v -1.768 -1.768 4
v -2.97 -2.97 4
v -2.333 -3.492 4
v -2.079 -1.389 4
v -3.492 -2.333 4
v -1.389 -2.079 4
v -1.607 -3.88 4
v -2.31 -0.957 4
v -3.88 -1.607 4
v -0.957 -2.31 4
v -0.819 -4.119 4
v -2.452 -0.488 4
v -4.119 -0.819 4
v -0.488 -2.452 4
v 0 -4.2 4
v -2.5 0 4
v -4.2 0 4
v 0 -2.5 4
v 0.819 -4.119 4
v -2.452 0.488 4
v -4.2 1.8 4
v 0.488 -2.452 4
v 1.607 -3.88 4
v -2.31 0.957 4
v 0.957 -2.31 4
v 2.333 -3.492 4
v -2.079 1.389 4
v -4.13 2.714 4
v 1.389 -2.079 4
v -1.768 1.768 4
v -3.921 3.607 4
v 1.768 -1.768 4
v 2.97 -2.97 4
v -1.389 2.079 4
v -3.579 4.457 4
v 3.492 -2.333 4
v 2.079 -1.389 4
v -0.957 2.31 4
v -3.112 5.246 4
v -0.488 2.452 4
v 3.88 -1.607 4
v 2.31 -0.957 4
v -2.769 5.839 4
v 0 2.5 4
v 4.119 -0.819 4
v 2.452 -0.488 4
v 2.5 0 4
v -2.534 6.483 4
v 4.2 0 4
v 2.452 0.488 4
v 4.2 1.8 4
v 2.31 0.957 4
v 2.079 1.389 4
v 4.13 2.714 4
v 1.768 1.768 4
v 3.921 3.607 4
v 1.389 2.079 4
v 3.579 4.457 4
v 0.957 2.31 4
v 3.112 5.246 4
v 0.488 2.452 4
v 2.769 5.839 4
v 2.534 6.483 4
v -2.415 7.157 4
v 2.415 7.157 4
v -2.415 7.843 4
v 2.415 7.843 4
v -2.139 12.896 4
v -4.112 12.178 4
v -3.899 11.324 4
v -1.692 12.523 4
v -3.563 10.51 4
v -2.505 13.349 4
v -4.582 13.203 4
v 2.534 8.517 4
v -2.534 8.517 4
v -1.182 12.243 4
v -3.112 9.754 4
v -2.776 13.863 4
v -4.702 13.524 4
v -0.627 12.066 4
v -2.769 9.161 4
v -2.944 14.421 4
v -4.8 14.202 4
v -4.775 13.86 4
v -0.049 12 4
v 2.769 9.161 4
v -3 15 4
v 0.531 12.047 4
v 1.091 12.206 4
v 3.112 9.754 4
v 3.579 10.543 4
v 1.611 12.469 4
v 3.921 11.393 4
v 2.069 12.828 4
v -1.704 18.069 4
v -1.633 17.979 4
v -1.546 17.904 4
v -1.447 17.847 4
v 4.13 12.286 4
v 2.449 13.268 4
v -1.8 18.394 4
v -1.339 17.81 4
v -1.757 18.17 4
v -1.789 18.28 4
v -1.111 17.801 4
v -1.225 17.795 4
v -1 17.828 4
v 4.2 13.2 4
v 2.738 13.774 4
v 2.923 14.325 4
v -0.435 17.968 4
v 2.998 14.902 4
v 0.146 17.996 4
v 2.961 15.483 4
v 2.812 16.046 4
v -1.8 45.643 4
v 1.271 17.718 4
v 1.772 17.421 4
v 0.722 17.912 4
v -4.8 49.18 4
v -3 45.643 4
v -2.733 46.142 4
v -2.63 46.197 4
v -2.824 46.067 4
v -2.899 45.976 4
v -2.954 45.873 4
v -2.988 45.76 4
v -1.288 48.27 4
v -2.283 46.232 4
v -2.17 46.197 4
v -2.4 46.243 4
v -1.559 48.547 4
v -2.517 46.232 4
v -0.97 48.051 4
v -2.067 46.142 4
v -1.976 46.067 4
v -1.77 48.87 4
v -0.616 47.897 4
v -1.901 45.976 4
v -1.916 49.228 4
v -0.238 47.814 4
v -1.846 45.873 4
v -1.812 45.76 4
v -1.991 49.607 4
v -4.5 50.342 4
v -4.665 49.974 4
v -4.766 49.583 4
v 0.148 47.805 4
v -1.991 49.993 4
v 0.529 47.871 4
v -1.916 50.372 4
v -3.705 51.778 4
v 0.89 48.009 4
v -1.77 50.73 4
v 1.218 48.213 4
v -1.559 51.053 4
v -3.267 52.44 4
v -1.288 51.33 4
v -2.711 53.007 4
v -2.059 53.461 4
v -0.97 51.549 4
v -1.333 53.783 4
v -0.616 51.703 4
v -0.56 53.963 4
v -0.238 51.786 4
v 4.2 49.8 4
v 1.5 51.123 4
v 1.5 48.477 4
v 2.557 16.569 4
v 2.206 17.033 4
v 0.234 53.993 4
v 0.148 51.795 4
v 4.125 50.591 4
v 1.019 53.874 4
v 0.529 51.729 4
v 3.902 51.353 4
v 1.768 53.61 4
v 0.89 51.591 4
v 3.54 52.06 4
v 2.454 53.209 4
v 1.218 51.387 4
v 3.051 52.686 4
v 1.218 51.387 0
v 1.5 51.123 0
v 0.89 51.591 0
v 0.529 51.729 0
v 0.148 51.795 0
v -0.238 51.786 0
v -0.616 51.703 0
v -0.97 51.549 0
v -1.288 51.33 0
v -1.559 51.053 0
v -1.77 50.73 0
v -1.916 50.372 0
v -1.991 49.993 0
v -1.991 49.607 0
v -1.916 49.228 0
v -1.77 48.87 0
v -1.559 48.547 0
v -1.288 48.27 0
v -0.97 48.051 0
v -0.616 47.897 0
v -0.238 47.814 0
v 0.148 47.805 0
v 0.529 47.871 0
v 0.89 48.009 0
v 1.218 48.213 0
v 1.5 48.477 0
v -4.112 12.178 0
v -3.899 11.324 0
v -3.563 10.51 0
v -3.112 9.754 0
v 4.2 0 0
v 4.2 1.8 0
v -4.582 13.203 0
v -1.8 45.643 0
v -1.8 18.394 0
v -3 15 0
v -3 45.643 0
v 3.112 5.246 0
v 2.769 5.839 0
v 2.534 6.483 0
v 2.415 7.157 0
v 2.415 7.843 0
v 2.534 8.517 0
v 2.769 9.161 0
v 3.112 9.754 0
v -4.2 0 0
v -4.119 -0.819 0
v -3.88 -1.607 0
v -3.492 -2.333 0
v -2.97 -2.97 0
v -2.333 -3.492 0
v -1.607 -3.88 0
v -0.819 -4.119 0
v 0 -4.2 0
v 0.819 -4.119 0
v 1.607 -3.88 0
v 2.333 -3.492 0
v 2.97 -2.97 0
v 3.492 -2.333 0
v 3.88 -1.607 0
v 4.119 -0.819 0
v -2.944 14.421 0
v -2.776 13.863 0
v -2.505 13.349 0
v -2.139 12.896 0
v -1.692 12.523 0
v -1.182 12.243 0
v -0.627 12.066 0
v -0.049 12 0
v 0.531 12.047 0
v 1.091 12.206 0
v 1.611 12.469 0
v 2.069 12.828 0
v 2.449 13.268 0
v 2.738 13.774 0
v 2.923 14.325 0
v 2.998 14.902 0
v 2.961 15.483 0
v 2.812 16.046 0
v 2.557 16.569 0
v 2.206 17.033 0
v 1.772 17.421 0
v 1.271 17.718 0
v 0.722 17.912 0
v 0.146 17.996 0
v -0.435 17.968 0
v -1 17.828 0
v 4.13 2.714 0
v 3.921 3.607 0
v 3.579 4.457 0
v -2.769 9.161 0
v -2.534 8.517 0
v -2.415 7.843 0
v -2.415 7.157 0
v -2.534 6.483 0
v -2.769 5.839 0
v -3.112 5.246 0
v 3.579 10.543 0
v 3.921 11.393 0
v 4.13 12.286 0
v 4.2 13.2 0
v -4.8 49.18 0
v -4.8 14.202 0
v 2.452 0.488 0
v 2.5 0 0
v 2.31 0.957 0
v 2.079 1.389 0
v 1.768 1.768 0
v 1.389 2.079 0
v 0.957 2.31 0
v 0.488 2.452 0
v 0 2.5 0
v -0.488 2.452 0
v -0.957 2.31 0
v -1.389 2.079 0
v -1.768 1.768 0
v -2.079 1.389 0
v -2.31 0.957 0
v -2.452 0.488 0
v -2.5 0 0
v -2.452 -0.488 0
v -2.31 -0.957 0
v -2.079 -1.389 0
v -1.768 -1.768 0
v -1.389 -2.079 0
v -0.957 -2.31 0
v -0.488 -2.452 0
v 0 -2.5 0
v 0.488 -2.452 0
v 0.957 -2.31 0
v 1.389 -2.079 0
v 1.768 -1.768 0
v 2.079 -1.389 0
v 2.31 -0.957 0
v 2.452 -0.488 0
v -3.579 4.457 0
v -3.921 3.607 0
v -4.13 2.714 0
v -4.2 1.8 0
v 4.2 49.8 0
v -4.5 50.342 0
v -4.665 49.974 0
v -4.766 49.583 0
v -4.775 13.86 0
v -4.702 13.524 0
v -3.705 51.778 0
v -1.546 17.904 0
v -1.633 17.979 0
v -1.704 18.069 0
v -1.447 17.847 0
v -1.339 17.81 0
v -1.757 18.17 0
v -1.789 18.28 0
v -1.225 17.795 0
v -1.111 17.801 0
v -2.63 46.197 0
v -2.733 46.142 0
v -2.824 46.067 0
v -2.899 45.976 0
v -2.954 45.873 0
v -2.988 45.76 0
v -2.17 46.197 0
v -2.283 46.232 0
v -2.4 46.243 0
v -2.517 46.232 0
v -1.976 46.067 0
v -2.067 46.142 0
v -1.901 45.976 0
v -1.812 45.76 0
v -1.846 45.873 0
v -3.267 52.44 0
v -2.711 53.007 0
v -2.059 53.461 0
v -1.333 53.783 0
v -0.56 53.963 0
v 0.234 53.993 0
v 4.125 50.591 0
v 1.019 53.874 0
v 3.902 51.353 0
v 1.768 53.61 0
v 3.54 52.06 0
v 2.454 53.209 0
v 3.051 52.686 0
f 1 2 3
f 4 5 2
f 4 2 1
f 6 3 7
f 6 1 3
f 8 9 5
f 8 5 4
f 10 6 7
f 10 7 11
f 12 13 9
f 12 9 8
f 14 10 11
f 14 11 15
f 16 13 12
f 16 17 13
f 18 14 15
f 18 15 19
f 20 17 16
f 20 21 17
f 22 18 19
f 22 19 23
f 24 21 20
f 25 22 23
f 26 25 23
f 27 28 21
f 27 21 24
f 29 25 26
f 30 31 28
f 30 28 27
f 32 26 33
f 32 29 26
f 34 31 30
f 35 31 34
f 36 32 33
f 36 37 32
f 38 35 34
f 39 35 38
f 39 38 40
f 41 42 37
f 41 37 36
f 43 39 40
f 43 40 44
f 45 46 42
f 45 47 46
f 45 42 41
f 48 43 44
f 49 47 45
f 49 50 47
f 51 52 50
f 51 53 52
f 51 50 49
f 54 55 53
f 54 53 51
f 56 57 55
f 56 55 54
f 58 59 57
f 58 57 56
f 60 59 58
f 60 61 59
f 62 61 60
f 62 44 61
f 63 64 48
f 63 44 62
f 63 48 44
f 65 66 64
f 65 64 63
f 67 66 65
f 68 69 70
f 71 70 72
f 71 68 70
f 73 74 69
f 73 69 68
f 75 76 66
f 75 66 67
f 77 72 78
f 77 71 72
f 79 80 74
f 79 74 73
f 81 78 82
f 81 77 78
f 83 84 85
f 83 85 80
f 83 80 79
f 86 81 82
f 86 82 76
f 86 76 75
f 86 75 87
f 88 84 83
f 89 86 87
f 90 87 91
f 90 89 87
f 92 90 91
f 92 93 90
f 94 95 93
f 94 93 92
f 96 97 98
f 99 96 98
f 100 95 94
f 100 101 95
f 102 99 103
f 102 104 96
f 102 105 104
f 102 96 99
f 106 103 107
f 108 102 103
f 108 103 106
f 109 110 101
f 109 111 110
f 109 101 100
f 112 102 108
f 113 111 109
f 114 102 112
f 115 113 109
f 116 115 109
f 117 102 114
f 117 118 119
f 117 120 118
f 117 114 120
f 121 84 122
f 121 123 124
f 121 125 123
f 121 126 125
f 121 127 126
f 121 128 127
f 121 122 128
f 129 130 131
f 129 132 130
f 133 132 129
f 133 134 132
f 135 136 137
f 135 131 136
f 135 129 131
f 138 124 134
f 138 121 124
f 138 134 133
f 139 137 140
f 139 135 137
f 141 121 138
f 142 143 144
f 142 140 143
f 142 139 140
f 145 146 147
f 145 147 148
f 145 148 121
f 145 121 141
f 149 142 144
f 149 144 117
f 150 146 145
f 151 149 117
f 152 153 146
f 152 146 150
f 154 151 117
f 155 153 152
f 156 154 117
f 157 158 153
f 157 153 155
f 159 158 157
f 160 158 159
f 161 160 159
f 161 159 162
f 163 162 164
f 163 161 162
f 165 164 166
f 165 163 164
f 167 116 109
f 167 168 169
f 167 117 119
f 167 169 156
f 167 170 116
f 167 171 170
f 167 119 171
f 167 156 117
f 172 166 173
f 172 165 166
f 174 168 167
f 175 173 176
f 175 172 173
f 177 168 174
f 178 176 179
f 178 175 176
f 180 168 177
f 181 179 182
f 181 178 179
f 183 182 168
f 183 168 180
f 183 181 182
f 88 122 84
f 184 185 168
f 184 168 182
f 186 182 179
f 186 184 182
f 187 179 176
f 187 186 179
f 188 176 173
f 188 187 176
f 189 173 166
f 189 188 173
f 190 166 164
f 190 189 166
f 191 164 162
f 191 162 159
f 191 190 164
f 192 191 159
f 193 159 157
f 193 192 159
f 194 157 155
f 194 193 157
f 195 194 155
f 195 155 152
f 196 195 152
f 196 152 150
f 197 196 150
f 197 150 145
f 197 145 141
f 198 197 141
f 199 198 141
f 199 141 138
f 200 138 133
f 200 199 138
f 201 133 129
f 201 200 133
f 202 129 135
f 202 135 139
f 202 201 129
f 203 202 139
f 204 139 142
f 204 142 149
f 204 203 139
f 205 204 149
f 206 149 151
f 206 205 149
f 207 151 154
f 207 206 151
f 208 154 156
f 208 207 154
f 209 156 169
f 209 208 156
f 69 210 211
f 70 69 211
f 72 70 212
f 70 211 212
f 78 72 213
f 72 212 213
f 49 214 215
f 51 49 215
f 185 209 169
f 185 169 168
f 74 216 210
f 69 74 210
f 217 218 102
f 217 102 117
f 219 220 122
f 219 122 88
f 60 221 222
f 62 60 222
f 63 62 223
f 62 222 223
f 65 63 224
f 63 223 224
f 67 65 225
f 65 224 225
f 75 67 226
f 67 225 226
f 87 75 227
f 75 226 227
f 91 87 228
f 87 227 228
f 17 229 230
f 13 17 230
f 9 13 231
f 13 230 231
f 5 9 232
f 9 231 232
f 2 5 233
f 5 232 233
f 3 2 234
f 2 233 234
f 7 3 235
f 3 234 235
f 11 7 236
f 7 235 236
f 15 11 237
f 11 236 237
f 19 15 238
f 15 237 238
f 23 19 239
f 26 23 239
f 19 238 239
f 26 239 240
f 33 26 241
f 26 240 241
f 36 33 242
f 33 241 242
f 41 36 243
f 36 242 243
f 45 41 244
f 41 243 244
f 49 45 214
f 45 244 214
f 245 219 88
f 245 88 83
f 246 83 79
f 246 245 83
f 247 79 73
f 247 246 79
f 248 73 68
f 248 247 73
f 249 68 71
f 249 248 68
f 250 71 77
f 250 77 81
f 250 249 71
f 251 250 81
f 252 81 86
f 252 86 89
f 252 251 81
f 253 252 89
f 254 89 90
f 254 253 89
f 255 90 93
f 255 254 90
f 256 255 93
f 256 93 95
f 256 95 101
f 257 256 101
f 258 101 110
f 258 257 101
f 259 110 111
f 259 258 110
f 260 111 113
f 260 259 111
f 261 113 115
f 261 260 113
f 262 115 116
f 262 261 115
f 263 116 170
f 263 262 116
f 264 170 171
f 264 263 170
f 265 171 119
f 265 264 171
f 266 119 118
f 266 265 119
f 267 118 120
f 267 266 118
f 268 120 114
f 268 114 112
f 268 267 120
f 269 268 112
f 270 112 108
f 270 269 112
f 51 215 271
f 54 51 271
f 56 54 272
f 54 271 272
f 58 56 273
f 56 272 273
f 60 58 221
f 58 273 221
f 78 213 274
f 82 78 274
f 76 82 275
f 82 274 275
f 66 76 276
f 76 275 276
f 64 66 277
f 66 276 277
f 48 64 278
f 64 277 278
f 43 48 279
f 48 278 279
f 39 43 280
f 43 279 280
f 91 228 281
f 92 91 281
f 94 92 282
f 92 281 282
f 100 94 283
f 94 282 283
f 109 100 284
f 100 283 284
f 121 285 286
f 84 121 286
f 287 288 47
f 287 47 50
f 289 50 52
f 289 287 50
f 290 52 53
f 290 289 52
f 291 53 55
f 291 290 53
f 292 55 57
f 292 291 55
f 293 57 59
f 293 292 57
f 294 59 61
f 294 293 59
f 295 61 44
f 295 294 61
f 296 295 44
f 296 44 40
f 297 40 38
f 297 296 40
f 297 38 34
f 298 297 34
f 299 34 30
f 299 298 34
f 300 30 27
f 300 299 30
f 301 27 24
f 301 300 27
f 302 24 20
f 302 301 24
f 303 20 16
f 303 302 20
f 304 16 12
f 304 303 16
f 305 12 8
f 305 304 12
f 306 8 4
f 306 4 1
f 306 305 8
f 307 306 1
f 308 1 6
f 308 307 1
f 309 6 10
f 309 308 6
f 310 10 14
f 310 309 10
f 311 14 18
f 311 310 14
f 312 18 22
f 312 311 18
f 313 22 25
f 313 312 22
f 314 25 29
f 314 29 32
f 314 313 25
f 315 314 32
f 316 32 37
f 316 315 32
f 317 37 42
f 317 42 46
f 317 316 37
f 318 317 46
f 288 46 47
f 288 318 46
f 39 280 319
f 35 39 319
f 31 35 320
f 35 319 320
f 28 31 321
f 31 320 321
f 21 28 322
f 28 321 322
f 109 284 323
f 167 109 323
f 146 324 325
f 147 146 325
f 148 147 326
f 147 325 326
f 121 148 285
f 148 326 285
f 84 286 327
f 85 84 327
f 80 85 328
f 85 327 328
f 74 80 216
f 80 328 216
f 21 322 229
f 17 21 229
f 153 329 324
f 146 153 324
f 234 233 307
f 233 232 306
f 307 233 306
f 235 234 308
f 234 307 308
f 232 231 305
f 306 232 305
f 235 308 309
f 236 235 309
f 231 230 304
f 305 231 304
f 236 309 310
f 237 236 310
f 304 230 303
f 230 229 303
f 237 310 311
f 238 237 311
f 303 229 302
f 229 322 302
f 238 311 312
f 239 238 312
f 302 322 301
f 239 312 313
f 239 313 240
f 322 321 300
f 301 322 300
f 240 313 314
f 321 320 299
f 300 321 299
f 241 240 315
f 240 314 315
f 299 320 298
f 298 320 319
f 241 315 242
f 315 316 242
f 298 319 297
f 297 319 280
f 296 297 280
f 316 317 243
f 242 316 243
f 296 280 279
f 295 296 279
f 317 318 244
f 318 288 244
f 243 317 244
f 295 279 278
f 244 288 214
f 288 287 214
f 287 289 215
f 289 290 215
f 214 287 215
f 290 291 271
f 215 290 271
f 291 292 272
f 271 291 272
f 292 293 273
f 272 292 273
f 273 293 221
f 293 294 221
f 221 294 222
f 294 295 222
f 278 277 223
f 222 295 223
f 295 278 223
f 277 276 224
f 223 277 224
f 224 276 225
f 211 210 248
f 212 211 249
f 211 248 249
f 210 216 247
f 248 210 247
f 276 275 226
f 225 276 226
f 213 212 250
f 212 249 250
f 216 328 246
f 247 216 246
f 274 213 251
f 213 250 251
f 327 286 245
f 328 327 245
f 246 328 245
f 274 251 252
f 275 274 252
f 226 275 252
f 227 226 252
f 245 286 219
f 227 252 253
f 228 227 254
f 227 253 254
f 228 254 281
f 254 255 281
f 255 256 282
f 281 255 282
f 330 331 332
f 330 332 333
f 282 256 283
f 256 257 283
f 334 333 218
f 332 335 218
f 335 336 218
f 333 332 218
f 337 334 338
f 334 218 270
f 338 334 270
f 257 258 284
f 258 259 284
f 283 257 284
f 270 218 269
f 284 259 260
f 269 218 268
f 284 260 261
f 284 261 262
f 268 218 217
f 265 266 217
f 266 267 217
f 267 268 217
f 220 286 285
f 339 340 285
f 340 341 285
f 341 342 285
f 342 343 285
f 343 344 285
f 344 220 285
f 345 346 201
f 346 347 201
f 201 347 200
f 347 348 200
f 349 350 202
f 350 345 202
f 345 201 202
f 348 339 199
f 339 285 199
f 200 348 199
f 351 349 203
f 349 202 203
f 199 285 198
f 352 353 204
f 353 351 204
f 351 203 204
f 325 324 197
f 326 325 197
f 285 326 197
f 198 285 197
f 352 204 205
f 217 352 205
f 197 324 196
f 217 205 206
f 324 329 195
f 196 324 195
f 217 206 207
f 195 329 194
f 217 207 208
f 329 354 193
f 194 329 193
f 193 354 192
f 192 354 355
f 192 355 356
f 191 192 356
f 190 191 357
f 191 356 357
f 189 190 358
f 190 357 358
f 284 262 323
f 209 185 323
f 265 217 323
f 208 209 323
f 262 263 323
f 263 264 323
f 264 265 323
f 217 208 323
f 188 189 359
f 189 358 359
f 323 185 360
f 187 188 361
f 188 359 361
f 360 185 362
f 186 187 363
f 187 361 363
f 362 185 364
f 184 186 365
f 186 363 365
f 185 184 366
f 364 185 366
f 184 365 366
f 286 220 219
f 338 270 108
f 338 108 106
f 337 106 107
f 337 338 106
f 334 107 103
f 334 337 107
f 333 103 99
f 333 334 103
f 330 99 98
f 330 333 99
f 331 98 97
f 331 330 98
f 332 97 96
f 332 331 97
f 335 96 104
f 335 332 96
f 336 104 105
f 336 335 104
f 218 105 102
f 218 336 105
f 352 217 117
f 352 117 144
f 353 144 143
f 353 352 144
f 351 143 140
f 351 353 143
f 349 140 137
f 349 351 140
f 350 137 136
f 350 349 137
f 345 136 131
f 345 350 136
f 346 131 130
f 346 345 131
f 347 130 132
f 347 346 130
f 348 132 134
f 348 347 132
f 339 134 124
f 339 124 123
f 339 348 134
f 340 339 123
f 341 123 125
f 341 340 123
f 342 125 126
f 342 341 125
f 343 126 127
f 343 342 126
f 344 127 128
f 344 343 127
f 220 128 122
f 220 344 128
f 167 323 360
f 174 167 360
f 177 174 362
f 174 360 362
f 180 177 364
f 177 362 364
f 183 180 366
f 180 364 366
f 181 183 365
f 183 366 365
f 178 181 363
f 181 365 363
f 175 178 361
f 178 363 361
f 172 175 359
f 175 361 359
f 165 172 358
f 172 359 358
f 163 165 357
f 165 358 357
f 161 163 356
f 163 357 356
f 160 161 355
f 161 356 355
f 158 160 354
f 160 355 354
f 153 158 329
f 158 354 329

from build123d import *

# Parameters (mm, degrees)
SKETCH_1_R      = 2.5
EXTRUDE_1_DEPTH = 4


with BuildPart() as part:
    # 草图1 → 凸台-拉伸1 (new body)
    with BuildSketch(Plane.XY):
        with BuildLine():
            Line((-3.705318961, 51.777526587), (-4.499753228, 50.342391759))
            ThreePointArc((-4.499753228, 50.342391759), (-4.72372629, 49.780297575), (-4.8, 49.180050853))
            Line((-4.8, 49.180050853), (-4.8, 14.202498322))
            ThreePointArc((-4.8, 14.202498322), (-4.74482021, 13.6908166), (-4.581818179, 13.20266362))
            Line((-4.581818179, 13.20266362), (-4.112355754, 12.178212626))
            ThreePointArc((-4.112355754, 12.178212626), (-3.746152658, 10.910853721), (-3.111838791, 9.754156171))
            ThreePointArc((-3.111838791, 9.754156171), (-2.4, 7.5), (-3.111838791, 5.245843829))
            ThreePointArc((-3.111838791, 5.245843829), (-3.921495991, 3.606788208), (-4.2, 1.8))
            Line((-4.2, 1.8), (-4.2, 0))
            ThreePointArc((-4.2, 0), (0, -4.2), (4.2, 0))
            Line((4.2, 0), (4.2, 1.8))
            ThreePointArc((4.2, 1.8), (3.921495991, 3.606788208), (3.111838791, 5.245843829))
            ThreePointArc((3.111838791, 5.245843829), (2.4, 7.5), (3.111838791, 9.754156171))
            ThreePointArc((3.111838791, 9.754156171), (3.921495991, 11.393211792), (4.2, 13.2))
            Line((4.2, 13.2), (4.2, 49.8))
            ThreePointArc((4.2, 49.8), (1.019230191, 53.874453315), (-3.705318961, 51.777526587))
        make_face()
        Circle(SKETCH_1_R, mode=Mode.SUBTRACT)
        with BuildLine():
            Line((-3, 45.643078062), (-3, 15))
            ThreePointArc((-3, 15), (2.449489743, 13.267949192), (-1, 17.828427125))
            ThreePointArc((-1, 17.828427125), (-1.546410162, 17.904214601), (-1.8, 18.39411255))
            Line((-1.8, 18.39411255), (-1.8, 45.643078062))
            ThreePointArc((-1.8, 45.643078062), (-2.4, 46.243078062), (-3, 45.643078062))
        make_face(mode=Mode.SUBTRACT)
        with BuildLine():
            Line((1.5, 48.477124344), (1.5, 51.122875656))
            ThreePointArc((1.5, 51.122875656), (-2, 49.8), (1.5, 48.477124344))
        make_face(mode=Mode.SUBTRACT)
    extrude(amount=EXTRUDE_1_DEPTH)


solid = part.part
